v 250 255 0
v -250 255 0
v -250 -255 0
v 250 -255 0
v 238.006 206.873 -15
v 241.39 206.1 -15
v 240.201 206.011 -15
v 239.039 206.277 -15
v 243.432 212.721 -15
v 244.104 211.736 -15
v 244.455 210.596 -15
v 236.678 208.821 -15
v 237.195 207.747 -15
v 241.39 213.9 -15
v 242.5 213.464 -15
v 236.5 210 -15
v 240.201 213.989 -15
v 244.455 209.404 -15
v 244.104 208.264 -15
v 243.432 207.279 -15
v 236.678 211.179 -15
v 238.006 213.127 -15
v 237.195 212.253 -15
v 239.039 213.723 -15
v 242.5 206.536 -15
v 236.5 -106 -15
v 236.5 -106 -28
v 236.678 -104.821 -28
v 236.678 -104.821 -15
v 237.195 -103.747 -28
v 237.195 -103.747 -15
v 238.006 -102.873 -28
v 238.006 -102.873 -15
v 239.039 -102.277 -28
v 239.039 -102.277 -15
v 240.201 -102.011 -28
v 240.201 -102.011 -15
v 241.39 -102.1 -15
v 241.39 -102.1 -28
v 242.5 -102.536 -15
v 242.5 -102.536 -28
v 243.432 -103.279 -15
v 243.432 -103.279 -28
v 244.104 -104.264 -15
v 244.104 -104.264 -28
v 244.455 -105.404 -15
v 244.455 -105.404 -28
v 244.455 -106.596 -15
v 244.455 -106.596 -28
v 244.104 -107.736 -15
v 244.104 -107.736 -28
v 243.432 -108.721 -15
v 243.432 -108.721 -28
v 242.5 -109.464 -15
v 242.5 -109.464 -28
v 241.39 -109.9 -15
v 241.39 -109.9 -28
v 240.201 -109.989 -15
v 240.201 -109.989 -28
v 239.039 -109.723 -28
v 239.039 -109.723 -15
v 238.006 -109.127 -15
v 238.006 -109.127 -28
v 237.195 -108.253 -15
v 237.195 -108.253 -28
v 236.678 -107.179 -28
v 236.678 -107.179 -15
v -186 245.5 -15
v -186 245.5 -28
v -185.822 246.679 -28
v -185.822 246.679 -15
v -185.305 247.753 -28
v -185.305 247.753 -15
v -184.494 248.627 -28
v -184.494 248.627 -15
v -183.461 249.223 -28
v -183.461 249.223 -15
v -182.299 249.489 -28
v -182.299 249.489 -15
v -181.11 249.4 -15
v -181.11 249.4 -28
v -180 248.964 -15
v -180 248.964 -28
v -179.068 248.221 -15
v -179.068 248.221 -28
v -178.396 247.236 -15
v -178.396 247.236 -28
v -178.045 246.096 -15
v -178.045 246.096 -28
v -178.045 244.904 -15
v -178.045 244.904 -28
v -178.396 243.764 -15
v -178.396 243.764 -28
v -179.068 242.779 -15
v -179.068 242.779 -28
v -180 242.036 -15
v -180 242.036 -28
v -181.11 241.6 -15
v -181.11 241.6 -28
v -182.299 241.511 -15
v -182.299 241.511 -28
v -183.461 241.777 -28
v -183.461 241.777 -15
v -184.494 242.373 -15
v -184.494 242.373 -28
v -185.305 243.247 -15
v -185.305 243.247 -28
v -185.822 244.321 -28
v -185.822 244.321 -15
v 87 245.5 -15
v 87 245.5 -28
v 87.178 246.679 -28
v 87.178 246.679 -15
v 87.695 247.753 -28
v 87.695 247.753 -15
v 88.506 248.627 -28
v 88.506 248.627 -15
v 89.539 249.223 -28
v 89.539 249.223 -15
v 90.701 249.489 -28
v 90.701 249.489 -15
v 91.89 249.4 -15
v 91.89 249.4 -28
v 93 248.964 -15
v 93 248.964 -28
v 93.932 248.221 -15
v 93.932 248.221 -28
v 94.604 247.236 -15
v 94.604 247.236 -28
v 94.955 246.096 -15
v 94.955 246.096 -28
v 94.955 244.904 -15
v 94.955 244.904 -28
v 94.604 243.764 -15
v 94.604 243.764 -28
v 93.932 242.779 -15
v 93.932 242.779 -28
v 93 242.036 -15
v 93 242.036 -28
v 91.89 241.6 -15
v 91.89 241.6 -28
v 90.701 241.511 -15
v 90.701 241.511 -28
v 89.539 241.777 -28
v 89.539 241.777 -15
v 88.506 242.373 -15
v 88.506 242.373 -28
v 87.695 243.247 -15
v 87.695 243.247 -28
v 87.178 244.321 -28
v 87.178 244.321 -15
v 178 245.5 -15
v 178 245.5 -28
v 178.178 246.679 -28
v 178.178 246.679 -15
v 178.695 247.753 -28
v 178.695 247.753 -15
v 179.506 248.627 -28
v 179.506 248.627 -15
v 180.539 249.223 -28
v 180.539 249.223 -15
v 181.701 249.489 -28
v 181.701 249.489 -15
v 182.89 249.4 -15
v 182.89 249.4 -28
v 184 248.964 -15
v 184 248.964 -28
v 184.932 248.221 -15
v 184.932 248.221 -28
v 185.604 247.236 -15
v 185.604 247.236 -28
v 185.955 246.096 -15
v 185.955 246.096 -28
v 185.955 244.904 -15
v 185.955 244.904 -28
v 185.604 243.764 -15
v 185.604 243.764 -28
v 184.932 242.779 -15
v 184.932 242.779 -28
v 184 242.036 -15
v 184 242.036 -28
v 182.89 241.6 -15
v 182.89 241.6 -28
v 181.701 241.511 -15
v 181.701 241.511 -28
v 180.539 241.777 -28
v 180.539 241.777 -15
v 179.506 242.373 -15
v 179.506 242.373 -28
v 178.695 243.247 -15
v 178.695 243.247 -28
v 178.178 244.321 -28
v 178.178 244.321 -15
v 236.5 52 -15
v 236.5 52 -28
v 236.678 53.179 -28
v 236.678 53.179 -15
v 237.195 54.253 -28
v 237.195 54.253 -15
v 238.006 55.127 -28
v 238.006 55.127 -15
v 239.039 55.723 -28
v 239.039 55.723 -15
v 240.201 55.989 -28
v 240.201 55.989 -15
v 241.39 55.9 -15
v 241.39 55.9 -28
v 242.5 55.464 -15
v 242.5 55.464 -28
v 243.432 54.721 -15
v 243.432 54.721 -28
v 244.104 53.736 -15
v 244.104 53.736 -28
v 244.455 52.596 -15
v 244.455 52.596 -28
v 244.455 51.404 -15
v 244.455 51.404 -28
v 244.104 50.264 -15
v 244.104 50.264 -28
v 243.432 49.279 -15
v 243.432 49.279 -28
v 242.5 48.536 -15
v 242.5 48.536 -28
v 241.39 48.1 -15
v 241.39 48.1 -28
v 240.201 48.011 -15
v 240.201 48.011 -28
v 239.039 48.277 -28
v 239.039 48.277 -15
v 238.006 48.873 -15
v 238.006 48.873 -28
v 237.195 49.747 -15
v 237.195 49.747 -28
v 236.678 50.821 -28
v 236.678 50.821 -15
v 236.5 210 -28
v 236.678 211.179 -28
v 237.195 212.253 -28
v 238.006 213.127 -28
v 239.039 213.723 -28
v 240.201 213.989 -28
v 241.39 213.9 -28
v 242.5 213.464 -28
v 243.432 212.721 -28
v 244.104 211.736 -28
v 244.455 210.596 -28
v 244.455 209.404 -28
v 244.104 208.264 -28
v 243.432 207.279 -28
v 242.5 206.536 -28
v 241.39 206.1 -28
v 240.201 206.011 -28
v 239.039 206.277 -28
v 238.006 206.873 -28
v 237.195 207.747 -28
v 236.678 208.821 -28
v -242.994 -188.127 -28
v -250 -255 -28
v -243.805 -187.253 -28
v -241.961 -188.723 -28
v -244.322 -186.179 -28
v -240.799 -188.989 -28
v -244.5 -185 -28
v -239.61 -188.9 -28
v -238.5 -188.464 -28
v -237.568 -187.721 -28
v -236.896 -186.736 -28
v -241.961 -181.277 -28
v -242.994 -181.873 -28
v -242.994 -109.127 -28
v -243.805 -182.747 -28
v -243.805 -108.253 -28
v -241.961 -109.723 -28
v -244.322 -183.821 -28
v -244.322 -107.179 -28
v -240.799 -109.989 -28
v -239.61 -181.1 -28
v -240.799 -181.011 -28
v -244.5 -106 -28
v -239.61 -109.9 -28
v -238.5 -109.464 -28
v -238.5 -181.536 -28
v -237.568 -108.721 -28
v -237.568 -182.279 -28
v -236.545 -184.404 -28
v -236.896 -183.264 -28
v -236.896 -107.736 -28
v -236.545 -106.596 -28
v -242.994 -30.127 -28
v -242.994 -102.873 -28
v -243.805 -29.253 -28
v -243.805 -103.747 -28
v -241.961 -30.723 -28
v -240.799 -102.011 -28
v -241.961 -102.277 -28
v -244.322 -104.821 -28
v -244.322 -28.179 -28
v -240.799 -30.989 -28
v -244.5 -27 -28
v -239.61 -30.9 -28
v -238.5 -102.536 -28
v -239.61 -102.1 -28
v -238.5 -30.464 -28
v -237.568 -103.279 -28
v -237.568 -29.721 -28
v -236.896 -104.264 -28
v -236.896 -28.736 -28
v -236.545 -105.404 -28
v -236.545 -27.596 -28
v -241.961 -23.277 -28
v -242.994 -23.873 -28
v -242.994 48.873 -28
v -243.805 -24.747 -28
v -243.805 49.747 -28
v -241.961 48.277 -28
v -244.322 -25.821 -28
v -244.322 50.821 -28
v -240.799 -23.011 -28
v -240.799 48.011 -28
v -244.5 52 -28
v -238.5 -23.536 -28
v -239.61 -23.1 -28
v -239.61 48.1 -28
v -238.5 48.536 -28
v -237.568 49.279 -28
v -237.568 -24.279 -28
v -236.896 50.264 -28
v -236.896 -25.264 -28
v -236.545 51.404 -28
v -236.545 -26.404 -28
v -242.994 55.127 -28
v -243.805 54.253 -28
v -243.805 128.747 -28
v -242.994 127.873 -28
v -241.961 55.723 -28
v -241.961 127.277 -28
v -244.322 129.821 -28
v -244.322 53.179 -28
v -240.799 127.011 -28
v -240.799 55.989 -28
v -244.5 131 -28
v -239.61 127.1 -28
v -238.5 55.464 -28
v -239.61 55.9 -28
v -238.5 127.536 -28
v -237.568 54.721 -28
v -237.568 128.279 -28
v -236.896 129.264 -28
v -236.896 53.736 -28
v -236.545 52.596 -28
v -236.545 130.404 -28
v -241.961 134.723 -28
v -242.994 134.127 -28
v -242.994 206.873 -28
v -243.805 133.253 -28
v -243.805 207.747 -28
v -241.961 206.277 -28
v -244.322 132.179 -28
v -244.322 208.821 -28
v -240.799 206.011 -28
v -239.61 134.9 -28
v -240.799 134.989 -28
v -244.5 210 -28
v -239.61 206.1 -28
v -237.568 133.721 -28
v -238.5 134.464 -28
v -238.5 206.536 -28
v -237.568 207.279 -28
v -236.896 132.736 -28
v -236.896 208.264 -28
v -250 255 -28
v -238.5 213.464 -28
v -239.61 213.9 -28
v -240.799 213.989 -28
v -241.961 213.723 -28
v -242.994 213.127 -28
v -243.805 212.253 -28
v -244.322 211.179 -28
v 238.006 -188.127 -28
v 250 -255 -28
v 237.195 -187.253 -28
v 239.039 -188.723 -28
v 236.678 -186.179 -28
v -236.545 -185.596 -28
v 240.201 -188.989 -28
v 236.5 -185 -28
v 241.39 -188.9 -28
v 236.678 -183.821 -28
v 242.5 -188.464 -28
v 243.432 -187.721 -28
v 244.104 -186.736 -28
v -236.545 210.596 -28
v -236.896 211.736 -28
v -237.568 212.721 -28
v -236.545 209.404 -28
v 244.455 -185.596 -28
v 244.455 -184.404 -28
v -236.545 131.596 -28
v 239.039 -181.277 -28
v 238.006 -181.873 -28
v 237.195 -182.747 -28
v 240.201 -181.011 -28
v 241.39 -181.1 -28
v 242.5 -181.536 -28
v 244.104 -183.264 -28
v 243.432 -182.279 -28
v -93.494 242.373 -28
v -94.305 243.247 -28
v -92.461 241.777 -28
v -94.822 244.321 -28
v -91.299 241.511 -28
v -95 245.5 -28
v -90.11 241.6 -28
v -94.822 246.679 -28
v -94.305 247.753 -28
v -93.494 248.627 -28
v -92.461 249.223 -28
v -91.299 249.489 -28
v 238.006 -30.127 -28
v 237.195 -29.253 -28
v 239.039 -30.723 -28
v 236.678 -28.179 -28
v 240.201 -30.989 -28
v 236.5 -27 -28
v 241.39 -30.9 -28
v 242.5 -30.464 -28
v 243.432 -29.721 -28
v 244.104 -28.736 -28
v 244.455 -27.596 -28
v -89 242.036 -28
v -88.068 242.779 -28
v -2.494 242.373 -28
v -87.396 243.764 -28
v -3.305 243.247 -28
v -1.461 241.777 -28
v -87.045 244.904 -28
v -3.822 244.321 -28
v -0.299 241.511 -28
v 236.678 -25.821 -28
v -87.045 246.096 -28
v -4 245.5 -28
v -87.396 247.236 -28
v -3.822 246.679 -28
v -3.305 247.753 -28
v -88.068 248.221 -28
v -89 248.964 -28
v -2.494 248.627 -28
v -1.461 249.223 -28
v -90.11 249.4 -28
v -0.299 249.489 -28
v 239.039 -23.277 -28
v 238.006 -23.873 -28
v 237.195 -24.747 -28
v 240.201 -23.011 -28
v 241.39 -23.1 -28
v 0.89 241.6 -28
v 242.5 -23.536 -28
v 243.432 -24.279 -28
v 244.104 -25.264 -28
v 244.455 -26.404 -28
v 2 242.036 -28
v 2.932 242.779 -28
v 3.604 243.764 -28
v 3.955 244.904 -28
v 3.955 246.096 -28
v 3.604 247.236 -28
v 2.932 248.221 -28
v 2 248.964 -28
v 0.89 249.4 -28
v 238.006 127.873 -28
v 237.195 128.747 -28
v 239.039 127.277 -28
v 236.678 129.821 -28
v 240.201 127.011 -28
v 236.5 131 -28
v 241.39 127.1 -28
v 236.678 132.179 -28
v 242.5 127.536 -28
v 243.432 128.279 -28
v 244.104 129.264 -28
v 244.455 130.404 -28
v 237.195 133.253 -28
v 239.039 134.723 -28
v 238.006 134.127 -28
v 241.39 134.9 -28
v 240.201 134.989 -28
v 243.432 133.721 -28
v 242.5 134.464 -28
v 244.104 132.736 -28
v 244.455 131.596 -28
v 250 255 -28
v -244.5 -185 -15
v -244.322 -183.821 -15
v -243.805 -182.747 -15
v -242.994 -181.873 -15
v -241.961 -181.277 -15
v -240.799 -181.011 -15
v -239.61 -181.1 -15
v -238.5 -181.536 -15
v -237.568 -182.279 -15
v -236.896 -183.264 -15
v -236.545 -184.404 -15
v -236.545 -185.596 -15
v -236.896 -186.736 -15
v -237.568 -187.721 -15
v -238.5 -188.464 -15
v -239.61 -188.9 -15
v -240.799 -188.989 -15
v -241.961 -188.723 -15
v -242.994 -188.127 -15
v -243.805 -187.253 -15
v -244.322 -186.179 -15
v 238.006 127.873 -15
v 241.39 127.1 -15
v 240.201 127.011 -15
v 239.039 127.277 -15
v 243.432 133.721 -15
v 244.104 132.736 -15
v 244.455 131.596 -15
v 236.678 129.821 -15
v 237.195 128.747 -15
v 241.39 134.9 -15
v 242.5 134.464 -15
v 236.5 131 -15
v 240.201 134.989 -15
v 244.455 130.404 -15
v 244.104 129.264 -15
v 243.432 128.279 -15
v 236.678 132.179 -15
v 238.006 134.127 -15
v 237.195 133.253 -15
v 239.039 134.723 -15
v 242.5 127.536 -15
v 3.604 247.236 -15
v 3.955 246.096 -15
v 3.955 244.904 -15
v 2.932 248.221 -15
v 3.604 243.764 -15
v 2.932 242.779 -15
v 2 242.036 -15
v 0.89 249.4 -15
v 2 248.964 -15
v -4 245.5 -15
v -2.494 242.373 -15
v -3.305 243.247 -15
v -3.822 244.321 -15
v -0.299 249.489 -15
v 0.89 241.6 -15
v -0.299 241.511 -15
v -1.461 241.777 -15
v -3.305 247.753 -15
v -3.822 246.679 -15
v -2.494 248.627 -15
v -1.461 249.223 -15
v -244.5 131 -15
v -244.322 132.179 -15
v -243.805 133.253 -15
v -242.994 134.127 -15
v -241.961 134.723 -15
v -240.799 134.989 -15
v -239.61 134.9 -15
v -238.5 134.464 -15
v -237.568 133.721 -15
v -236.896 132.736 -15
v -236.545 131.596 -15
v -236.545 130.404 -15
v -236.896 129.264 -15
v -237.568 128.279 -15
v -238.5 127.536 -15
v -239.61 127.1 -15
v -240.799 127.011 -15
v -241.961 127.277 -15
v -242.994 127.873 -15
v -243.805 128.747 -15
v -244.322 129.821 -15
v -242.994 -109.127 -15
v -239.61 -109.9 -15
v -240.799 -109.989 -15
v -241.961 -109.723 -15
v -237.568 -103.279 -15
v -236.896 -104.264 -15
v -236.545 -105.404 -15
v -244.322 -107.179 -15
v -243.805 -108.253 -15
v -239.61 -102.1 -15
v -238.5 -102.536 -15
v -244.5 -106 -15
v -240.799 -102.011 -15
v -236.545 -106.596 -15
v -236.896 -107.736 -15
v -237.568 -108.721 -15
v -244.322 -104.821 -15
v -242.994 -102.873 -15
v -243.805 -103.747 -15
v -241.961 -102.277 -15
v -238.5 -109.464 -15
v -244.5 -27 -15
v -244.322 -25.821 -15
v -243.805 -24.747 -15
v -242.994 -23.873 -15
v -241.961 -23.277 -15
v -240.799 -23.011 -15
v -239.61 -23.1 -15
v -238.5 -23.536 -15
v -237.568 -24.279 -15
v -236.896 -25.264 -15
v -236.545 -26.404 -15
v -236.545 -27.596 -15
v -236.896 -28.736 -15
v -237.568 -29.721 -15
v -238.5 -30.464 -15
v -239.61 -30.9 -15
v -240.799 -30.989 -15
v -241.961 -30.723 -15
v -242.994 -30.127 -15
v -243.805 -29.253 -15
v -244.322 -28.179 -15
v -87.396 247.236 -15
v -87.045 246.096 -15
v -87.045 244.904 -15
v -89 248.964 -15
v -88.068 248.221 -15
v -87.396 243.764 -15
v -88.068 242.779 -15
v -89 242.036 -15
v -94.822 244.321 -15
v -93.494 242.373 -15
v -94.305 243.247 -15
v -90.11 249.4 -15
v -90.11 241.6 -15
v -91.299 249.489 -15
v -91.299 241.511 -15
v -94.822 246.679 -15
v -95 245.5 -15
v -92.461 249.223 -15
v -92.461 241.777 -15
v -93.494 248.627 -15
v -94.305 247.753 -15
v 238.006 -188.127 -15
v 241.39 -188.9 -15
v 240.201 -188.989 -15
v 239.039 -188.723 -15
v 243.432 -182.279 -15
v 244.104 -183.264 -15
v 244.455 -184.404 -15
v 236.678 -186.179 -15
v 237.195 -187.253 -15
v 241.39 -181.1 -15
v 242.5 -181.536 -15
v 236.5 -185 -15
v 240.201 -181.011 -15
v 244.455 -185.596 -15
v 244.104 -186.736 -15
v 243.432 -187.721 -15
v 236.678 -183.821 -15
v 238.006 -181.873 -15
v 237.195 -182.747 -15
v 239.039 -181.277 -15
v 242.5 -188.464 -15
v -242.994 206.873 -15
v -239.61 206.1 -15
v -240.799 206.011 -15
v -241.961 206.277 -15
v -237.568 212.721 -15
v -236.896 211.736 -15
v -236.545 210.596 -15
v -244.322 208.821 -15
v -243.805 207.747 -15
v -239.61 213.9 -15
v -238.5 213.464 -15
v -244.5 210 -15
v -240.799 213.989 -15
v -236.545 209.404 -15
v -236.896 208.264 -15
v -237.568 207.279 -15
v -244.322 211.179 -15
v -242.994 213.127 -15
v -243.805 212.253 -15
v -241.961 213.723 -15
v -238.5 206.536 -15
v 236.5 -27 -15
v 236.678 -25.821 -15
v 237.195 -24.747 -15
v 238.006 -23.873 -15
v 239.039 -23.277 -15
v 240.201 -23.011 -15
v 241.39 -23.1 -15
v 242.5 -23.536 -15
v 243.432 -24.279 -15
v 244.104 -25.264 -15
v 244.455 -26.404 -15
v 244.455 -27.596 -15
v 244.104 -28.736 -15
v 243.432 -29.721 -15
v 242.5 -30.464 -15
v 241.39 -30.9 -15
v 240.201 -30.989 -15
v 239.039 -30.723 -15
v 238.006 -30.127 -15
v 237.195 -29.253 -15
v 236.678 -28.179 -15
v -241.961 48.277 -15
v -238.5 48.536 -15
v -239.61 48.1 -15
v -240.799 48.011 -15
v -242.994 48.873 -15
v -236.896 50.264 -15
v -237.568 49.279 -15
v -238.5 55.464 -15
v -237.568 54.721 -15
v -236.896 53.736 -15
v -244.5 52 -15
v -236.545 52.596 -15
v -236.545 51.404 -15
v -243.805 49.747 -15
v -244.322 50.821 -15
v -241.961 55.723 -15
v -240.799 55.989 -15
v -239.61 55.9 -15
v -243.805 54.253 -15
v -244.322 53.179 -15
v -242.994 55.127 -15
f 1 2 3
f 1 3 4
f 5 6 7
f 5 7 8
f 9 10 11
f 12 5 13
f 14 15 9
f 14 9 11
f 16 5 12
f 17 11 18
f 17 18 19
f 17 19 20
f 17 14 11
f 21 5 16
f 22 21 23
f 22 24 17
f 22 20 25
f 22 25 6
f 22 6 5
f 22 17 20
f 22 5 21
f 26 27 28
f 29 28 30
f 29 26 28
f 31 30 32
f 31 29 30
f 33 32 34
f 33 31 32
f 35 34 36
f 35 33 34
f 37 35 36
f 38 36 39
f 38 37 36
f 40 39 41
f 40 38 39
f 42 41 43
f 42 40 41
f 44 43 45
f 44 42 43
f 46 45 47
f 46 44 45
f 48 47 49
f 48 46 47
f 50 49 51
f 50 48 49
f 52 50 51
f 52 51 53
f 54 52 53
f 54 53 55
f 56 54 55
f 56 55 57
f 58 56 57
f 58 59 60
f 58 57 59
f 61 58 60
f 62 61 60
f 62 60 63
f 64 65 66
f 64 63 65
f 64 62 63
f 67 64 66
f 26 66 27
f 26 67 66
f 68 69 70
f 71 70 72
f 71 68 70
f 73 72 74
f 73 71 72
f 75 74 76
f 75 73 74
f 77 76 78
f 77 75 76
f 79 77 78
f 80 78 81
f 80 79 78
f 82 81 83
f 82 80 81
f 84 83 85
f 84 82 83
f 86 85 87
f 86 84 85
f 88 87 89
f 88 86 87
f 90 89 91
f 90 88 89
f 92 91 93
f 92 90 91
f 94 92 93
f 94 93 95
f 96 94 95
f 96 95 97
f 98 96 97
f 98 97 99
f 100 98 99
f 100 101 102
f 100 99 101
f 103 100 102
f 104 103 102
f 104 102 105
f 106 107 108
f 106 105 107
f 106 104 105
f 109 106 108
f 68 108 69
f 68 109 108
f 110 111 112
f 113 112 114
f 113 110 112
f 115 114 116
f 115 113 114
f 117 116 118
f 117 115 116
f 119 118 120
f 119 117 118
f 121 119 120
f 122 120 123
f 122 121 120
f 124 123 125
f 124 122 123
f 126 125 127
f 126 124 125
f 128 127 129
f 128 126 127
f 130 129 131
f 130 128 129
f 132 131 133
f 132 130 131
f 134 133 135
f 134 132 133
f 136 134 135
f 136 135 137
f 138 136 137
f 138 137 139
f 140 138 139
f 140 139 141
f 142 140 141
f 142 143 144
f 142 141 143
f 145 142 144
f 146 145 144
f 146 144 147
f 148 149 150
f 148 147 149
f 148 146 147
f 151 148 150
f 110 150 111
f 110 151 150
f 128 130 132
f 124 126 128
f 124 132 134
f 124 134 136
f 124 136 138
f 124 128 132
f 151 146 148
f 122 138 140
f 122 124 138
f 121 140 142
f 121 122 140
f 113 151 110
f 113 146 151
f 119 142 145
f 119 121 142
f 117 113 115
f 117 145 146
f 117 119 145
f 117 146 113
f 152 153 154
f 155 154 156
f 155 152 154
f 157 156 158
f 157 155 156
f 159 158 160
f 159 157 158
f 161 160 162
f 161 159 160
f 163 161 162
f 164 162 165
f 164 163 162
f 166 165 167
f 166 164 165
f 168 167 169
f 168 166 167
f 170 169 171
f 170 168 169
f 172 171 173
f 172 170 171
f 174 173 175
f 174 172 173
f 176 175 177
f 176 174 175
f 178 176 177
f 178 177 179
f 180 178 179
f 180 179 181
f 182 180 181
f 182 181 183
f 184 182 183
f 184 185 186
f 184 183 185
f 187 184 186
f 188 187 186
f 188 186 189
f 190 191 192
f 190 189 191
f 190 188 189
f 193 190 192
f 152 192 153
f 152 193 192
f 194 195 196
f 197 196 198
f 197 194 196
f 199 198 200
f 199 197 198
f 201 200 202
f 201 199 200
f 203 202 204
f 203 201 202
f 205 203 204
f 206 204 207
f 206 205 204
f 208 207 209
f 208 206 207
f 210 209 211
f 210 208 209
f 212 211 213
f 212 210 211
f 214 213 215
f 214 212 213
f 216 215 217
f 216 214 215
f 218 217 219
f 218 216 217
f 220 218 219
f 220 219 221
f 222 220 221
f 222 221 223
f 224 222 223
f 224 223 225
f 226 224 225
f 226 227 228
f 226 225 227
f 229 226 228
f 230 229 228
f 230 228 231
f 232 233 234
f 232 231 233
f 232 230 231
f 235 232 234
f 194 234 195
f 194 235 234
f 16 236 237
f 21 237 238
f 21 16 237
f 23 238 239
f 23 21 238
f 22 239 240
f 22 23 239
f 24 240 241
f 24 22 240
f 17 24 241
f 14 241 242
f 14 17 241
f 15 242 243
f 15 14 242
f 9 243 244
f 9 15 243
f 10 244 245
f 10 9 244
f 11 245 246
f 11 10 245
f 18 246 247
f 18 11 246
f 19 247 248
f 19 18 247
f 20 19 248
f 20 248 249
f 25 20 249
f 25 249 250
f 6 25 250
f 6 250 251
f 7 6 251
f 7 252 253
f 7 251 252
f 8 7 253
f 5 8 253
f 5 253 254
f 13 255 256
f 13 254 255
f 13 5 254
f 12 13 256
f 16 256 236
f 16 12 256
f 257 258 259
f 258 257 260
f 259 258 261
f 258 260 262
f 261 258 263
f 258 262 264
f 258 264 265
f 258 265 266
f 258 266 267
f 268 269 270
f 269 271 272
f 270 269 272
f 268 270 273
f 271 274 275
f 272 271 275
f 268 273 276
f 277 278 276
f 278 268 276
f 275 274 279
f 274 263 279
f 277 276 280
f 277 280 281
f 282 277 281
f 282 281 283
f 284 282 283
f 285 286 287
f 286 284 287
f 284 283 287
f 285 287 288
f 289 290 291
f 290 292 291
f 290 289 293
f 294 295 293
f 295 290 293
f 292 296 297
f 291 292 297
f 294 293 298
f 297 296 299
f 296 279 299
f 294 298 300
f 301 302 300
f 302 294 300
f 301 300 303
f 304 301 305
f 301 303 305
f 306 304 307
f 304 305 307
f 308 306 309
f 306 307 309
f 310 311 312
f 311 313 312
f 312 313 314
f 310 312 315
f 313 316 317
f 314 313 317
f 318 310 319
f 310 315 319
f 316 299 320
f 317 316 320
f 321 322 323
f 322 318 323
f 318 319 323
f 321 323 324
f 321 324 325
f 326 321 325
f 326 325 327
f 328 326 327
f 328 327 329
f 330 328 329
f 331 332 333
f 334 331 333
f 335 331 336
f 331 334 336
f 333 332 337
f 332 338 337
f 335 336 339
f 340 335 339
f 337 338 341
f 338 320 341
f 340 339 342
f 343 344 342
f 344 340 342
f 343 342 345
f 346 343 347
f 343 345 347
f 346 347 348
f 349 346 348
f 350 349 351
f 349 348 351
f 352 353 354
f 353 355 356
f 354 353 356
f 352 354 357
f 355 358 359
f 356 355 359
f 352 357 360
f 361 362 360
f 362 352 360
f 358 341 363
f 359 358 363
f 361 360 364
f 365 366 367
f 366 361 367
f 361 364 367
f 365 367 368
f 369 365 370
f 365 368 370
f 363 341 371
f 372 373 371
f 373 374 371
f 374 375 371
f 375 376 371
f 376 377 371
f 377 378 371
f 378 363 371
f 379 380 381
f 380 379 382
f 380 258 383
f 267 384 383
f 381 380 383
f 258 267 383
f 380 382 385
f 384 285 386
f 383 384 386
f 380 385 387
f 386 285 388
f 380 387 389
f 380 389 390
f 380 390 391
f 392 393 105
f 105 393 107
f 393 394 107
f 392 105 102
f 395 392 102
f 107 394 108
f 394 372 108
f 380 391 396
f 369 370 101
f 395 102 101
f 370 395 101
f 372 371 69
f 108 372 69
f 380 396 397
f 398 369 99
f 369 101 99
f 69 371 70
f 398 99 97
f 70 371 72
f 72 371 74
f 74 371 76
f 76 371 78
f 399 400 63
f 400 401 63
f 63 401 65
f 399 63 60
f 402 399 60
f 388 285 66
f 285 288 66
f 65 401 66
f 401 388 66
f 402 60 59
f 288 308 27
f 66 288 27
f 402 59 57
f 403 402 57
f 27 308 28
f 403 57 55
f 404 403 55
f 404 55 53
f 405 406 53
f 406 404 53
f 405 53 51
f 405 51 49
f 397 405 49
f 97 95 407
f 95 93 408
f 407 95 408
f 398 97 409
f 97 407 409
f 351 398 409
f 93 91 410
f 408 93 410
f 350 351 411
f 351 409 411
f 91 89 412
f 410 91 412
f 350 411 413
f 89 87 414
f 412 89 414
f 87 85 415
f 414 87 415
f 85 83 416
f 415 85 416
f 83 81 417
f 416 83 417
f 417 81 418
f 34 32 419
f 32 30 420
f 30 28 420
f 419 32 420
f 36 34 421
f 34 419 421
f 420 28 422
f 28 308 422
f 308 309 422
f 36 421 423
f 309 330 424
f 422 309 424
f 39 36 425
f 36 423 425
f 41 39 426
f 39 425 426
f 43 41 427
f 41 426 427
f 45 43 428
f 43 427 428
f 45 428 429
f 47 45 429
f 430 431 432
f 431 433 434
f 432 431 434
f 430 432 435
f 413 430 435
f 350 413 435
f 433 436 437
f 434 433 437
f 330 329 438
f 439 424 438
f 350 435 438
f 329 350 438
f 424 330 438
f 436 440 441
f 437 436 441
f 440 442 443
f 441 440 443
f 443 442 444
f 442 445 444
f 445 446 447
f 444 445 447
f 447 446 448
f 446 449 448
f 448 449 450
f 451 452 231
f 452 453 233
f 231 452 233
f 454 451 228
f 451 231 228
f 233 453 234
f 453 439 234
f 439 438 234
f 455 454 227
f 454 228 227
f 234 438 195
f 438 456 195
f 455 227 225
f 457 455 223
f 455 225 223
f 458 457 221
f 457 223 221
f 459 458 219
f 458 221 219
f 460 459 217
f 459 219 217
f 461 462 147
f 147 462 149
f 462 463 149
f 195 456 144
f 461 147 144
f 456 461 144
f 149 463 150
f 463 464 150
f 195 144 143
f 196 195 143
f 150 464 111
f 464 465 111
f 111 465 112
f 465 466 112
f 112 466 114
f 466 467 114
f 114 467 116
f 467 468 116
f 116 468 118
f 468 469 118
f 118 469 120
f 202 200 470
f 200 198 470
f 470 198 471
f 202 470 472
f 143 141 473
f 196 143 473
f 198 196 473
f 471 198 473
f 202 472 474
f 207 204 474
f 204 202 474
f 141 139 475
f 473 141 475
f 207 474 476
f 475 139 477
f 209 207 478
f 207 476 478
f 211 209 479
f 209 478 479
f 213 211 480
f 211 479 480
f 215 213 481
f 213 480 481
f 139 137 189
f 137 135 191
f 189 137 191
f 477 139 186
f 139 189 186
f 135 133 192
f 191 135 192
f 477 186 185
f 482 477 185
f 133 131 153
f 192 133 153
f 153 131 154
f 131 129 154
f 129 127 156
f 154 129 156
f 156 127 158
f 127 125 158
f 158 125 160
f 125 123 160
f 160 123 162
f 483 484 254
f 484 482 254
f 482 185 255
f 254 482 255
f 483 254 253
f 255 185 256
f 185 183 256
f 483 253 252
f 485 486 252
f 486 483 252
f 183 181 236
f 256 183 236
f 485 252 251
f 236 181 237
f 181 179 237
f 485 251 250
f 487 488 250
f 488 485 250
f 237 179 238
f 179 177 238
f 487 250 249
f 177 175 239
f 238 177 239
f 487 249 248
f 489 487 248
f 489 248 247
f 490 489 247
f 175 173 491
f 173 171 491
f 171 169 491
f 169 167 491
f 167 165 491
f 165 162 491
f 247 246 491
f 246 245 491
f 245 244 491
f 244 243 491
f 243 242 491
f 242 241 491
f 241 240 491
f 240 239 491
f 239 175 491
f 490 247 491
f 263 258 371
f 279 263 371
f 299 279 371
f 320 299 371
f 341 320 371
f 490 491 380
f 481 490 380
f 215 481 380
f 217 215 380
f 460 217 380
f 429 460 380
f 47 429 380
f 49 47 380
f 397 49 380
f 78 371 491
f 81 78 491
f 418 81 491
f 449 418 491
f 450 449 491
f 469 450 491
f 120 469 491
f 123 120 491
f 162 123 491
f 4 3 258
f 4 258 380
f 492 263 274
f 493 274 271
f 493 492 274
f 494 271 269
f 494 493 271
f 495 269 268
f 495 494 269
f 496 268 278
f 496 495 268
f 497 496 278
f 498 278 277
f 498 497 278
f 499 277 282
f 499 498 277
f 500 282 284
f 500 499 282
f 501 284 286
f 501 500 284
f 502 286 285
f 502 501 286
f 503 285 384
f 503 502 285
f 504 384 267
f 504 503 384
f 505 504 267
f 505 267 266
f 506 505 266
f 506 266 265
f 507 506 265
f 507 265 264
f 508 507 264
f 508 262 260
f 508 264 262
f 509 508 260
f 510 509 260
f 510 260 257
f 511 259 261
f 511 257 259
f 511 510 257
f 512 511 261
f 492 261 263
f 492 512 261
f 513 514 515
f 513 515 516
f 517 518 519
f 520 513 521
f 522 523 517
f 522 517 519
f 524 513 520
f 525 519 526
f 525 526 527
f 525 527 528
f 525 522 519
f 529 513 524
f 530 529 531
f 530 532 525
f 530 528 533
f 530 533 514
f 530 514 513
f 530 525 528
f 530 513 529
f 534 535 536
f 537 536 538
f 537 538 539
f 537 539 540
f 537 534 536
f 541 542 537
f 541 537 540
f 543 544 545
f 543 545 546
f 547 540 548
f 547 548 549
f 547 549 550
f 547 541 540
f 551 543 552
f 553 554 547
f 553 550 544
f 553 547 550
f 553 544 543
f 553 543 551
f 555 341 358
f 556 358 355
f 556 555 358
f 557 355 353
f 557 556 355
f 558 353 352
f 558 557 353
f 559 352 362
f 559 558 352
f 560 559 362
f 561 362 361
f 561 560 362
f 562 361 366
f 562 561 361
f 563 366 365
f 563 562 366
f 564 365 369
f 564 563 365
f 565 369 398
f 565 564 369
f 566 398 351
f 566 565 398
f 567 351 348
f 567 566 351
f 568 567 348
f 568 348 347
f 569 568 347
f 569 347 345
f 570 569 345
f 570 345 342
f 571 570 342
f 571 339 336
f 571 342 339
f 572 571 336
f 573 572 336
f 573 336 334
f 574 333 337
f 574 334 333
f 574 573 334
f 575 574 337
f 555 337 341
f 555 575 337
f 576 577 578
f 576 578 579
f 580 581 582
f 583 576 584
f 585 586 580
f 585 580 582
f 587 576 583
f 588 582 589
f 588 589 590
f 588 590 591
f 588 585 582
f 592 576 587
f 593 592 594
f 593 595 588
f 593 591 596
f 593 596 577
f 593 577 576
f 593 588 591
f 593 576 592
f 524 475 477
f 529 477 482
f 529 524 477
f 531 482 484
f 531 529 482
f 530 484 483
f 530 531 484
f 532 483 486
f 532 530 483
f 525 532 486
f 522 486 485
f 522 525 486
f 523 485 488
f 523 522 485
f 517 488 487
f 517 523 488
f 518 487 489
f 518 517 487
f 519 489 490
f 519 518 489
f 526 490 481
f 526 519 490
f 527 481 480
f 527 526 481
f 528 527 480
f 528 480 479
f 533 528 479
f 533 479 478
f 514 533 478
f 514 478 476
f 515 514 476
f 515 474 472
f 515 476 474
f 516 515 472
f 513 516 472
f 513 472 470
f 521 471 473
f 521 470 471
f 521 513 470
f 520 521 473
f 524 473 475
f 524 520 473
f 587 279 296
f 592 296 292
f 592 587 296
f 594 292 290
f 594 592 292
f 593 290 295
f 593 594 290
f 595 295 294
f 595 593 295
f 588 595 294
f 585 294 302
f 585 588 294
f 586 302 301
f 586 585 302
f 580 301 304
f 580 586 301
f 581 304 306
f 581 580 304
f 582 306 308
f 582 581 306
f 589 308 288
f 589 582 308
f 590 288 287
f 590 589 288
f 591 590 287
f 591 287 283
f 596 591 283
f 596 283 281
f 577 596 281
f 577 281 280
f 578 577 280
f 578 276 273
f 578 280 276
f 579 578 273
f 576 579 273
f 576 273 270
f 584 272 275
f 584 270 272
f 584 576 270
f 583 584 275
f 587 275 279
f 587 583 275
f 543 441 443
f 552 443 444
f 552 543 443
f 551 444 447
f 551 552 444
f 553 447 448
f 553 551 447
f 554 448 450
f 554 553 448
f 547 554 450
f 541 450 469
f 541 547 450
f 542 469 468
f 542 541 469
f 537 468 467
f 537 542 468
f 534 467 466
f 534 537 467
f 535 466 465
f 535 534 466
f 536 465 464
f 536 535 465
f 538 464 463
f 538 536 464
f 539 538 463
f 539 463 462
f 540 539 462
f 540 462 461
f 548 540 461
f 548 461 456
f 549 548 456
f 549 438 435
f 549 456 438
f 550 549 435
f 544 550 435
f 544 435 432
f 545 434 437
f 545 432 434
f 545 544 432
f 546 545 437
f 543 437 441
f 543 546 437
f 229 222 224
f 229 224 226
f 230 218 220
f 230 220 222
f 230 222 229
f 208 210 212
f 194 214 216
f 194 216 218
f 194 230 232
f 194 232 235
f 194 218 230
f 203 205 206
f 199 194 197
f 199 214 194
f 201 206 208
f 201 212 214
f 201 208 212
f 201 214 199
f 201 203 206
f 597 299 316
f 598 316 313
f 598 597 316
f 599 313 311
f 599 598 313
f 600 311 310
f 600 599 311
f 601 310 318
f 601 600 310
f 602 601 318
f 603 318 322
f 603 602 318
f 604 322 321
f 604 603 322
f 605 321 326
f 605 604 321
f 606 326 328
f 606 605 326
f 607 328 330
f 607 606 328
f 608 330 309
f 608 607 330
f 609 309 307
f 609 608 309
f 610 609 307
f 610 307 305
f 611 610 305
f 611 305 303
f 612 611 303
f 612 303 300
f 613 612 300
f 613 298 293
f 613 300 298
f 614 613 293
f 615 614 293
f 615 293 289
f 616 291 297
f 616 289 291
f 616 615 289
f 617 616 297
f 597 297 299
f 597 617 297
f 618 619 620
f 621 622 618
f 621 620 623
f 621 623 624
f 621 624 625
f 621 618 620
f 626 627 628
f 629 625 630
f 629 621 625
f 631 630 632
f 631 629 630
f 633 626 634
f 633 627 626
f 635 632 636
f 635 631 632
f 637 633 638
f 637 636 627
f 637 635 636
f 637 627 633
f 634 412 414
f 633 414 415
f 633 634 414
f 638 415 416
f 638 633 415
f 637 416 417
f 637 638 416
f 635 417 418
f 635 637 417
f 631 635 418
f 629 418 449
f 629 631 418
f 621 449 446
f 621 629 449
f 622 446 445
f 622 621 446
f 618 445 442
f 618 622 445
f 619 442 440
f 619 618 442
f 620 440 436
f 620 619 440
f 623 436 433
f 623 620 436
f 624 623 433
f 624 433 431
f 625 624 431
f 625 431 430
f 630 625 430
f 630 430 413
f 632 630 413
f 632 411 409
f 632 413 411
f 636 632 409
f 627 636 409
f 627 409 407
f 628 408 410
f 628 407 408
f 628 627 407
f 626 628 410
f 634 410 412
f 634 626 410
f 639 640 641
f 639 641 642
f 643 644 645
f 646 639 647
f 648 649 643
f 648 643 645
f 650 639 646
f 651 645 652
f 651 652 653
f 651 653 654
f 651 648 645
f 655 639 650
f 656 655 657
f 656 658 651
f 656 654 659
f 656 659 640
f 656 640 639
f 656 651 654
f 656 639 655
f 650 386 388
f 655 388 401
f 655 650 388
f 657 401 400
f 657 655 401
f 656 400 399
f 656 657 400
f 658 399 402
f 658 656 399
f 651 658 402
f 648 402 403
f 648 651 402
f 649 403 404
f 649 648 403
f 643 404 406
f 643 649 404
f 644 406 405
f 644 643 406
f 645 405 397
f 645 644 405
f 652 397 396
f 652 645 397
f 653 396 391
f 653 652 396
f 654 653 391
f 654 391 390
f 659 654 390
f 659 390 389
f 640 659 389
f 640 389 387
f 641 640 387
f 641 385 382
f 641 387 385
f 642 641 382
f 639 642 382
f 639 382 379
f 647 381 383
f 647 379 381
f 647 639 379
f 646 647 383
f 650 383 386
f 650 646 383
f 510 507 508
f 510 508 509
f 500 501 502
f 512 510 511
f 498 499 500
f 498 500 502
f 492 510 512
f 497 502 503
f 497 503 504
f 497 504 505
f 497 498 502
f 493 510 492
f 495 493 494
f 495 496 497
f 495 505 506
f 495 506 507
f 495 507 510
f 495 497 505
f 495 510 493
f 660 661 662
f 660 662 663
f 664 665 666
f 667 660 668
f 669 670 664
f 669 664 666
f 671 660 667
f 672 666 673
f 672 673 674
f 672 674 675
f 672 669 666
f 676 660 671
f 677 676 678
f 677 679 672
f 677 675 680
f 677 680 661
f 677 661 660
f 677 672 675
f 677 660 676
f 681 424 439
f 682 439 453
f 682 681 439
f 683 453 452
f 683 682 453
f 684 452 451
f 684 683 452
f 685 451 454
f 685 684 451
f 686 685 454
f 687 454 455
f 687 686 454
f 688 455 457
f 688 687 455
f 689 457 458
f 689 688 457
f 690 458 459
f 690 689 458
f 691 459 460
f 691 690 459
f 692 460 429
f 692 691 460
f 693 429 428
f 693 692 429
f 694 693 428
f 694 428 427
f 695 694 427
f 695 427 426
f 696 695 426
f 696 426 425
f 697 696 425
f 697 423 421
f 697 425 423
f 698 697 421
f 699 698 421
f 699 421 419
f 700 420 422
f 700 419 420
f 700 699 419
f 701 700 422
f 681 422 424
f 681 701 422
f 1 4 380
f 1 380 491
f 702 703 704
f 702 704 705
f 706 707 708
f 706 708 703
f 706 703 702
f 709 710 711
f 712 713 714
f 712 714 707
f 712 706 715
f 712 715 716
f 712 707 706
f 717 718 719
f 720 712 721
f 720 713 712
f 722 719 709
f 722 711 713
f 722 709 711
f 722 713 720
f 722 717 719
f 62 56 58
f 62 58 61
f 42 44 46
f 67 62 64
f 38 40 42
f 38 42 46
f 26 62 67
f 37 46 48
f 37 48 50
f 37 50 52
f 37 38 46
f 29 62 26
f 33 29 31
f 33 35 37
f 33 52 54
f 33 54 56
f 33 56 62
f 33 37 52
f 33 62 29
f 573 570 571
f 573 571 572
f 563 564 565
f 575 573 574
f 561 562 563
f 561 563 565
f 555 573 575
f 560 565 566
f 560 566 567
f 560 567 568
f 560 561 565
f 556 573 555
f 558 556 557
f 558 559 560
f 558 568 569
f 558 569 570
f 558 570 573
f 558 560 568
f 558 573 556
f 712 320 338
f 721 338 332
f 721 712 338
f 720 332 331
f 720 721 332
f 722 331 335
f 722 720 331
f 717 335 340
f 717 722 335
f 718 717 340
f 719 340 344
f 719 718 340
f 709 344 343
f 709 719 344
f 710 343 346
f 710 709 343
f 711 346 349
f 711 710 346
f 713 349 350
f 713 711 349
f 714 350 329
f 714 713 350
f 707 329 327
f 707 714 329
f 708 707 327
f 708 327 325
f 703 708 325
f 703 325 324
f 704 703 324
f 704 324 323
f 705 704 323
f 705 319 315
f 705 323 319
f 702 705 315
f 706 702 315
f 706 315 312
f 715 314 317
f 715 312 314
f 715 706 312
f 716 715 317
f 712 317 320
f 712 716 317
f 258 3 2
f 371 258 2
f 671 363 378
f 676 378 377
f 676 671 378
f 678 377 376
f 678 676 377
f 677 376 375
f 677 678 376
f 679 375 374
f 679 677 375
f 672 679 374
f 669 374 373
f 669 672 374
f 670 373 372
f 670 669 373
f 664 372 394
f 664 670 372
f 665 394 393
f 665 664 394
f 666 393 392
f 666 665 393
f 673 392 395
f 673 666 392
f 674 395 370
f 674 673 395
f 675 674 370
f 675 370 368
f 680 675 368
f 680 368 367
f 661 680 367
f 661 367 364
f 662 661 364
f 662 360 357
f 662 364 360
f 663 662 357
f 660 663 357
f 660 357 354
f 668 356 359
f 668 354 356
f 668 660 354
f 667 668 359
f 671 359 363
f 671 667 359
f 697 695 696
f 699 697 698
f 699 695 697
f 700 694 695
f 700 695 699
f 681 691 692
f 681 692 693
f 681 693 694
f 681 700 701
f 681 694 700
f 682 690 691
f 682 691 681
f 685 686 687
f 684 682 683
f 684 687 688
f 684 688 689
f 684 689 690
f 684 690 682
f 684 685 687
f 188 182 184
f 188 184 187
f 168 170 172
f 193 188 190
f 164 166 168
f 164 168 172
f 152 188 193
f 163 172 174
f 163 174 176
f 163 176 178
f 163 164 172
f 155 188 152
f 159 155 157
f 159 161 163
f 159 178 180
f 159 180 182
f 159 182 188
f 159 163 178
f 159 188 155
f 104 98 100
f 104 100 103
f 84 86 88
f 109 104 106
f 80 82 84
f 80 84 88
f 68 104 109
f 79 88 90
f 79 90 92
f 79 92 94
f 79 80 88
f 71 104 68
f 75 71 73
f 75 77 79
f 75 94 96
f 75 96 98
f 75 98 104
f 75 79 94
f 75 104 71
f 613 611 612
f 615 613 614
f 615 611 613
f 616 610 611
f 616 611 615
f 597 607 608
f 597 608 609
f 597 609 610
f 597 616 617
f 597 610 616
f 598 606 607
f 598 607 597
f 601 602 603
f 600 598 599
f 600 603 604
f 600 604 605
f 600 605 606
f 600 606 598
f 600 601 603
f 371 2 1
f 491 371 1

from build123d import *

# Parameters (mm, degrees)
SKETCH1_W               = 500
SKETCH1_H               = 510
BOSS_EXTRUDE1_DEPTH     = 28
CUT_EXTRUDE2_DEPTH      = 25
CUT_EXTRUDE2_DEPTH_BACK = 13
SKETCH3_R               = 4


with BuildPart() as part:
    # Sketch1 → Boss-Extrude1 (new body)
    with BuildSketch(Plane.XY):
        Rectangle(SKETCH1_W, SKETCH1_H)
    extrude(amount=-BOSS_EXTRUDE1_DEPTH)

    # Sketch3 → Cut-Extrude2 (cut, two sides: drawn at the far end of the back side and taken through both)
    with BuildSketch(Plane(origin=(0, 0, -28), x_dir=(1, 0, 0), z_dir=(0, 0, -1)).offset(-CUT_EXTRUDE2_DEPTH_BACK)):
        with Locations(Location((240.5, -210, 0), (0, 0, 180))):
            Circle(SKETCH3_R)
        with Locations(Location((182, -245.5, 0), (0, 0, 180))):
            Circle(SKETCH3_R)
        with Locations(Location((-240.5, -210, 0), (0, 0, 180))):
            Circle(SKETCH3_R)
        with Locations(Location((-240.5, -131, 0), (0, 0, 180))):
            Circle(SKETCH3_R)
        with Locations(Location((240.5, -131, 0), (0, 0, 180))):
            Circle(SKETCH3_R)
        with Locations(Location((-240.5, -52, 0), (0, 0, 180))):
            Circle(SKETCH3_R)
        with Locations(Location((240.5, -52, 0), (0, 0, 180))):
            Circle(SKETCH3_R)
        with Locations(Location((-240.5, 27, 0), (0, 0, 180))):
            Circle(SKETCH3_R)
        with Locations(Location((240.5, 27, 0), (0, 0, 180))):
            Circle(SKETCH3_R)
        with Locations(Location((-240.5, 106, 0), (0, 0, 180))):
            Circle(SKETCH3_R)
        with Locations(Location((240.5, 106, 0), (0, 0, 180))):
            Circle(SKETCH3_R)
        with Locations(Location((-182, -245.5, 0), (0, 0, 180))):
            Circle(SKETCH3_R)
        with Locations(Location((-240.5, 185, 0), (0, 0, 180))):
            Circle(SKETCH3_R)
        with Locations(Location((91, -245.5, 0), (0, 0, 180))):
            Circle(SKETCH3_R)
        with Locations(Location((0, -245.5, 0), (0, 0, 180))):
            Circle(SKETCH3_R)
        with Locations(Location((-91, -245.5, 0), (0, 0, 180))):
            Circle(SKETCH3_R)
        with Locations(Location((240.5, 185, 0), (0, 0, 180))):
            Circle(SKETCH3_R)
    extrude(amount=CUT_EXTRUDE2_DEPTH + CUT_EXTRUDE2_DEPTH_BACK, mode=Mode.SUBTRACT)


solid = part.part
